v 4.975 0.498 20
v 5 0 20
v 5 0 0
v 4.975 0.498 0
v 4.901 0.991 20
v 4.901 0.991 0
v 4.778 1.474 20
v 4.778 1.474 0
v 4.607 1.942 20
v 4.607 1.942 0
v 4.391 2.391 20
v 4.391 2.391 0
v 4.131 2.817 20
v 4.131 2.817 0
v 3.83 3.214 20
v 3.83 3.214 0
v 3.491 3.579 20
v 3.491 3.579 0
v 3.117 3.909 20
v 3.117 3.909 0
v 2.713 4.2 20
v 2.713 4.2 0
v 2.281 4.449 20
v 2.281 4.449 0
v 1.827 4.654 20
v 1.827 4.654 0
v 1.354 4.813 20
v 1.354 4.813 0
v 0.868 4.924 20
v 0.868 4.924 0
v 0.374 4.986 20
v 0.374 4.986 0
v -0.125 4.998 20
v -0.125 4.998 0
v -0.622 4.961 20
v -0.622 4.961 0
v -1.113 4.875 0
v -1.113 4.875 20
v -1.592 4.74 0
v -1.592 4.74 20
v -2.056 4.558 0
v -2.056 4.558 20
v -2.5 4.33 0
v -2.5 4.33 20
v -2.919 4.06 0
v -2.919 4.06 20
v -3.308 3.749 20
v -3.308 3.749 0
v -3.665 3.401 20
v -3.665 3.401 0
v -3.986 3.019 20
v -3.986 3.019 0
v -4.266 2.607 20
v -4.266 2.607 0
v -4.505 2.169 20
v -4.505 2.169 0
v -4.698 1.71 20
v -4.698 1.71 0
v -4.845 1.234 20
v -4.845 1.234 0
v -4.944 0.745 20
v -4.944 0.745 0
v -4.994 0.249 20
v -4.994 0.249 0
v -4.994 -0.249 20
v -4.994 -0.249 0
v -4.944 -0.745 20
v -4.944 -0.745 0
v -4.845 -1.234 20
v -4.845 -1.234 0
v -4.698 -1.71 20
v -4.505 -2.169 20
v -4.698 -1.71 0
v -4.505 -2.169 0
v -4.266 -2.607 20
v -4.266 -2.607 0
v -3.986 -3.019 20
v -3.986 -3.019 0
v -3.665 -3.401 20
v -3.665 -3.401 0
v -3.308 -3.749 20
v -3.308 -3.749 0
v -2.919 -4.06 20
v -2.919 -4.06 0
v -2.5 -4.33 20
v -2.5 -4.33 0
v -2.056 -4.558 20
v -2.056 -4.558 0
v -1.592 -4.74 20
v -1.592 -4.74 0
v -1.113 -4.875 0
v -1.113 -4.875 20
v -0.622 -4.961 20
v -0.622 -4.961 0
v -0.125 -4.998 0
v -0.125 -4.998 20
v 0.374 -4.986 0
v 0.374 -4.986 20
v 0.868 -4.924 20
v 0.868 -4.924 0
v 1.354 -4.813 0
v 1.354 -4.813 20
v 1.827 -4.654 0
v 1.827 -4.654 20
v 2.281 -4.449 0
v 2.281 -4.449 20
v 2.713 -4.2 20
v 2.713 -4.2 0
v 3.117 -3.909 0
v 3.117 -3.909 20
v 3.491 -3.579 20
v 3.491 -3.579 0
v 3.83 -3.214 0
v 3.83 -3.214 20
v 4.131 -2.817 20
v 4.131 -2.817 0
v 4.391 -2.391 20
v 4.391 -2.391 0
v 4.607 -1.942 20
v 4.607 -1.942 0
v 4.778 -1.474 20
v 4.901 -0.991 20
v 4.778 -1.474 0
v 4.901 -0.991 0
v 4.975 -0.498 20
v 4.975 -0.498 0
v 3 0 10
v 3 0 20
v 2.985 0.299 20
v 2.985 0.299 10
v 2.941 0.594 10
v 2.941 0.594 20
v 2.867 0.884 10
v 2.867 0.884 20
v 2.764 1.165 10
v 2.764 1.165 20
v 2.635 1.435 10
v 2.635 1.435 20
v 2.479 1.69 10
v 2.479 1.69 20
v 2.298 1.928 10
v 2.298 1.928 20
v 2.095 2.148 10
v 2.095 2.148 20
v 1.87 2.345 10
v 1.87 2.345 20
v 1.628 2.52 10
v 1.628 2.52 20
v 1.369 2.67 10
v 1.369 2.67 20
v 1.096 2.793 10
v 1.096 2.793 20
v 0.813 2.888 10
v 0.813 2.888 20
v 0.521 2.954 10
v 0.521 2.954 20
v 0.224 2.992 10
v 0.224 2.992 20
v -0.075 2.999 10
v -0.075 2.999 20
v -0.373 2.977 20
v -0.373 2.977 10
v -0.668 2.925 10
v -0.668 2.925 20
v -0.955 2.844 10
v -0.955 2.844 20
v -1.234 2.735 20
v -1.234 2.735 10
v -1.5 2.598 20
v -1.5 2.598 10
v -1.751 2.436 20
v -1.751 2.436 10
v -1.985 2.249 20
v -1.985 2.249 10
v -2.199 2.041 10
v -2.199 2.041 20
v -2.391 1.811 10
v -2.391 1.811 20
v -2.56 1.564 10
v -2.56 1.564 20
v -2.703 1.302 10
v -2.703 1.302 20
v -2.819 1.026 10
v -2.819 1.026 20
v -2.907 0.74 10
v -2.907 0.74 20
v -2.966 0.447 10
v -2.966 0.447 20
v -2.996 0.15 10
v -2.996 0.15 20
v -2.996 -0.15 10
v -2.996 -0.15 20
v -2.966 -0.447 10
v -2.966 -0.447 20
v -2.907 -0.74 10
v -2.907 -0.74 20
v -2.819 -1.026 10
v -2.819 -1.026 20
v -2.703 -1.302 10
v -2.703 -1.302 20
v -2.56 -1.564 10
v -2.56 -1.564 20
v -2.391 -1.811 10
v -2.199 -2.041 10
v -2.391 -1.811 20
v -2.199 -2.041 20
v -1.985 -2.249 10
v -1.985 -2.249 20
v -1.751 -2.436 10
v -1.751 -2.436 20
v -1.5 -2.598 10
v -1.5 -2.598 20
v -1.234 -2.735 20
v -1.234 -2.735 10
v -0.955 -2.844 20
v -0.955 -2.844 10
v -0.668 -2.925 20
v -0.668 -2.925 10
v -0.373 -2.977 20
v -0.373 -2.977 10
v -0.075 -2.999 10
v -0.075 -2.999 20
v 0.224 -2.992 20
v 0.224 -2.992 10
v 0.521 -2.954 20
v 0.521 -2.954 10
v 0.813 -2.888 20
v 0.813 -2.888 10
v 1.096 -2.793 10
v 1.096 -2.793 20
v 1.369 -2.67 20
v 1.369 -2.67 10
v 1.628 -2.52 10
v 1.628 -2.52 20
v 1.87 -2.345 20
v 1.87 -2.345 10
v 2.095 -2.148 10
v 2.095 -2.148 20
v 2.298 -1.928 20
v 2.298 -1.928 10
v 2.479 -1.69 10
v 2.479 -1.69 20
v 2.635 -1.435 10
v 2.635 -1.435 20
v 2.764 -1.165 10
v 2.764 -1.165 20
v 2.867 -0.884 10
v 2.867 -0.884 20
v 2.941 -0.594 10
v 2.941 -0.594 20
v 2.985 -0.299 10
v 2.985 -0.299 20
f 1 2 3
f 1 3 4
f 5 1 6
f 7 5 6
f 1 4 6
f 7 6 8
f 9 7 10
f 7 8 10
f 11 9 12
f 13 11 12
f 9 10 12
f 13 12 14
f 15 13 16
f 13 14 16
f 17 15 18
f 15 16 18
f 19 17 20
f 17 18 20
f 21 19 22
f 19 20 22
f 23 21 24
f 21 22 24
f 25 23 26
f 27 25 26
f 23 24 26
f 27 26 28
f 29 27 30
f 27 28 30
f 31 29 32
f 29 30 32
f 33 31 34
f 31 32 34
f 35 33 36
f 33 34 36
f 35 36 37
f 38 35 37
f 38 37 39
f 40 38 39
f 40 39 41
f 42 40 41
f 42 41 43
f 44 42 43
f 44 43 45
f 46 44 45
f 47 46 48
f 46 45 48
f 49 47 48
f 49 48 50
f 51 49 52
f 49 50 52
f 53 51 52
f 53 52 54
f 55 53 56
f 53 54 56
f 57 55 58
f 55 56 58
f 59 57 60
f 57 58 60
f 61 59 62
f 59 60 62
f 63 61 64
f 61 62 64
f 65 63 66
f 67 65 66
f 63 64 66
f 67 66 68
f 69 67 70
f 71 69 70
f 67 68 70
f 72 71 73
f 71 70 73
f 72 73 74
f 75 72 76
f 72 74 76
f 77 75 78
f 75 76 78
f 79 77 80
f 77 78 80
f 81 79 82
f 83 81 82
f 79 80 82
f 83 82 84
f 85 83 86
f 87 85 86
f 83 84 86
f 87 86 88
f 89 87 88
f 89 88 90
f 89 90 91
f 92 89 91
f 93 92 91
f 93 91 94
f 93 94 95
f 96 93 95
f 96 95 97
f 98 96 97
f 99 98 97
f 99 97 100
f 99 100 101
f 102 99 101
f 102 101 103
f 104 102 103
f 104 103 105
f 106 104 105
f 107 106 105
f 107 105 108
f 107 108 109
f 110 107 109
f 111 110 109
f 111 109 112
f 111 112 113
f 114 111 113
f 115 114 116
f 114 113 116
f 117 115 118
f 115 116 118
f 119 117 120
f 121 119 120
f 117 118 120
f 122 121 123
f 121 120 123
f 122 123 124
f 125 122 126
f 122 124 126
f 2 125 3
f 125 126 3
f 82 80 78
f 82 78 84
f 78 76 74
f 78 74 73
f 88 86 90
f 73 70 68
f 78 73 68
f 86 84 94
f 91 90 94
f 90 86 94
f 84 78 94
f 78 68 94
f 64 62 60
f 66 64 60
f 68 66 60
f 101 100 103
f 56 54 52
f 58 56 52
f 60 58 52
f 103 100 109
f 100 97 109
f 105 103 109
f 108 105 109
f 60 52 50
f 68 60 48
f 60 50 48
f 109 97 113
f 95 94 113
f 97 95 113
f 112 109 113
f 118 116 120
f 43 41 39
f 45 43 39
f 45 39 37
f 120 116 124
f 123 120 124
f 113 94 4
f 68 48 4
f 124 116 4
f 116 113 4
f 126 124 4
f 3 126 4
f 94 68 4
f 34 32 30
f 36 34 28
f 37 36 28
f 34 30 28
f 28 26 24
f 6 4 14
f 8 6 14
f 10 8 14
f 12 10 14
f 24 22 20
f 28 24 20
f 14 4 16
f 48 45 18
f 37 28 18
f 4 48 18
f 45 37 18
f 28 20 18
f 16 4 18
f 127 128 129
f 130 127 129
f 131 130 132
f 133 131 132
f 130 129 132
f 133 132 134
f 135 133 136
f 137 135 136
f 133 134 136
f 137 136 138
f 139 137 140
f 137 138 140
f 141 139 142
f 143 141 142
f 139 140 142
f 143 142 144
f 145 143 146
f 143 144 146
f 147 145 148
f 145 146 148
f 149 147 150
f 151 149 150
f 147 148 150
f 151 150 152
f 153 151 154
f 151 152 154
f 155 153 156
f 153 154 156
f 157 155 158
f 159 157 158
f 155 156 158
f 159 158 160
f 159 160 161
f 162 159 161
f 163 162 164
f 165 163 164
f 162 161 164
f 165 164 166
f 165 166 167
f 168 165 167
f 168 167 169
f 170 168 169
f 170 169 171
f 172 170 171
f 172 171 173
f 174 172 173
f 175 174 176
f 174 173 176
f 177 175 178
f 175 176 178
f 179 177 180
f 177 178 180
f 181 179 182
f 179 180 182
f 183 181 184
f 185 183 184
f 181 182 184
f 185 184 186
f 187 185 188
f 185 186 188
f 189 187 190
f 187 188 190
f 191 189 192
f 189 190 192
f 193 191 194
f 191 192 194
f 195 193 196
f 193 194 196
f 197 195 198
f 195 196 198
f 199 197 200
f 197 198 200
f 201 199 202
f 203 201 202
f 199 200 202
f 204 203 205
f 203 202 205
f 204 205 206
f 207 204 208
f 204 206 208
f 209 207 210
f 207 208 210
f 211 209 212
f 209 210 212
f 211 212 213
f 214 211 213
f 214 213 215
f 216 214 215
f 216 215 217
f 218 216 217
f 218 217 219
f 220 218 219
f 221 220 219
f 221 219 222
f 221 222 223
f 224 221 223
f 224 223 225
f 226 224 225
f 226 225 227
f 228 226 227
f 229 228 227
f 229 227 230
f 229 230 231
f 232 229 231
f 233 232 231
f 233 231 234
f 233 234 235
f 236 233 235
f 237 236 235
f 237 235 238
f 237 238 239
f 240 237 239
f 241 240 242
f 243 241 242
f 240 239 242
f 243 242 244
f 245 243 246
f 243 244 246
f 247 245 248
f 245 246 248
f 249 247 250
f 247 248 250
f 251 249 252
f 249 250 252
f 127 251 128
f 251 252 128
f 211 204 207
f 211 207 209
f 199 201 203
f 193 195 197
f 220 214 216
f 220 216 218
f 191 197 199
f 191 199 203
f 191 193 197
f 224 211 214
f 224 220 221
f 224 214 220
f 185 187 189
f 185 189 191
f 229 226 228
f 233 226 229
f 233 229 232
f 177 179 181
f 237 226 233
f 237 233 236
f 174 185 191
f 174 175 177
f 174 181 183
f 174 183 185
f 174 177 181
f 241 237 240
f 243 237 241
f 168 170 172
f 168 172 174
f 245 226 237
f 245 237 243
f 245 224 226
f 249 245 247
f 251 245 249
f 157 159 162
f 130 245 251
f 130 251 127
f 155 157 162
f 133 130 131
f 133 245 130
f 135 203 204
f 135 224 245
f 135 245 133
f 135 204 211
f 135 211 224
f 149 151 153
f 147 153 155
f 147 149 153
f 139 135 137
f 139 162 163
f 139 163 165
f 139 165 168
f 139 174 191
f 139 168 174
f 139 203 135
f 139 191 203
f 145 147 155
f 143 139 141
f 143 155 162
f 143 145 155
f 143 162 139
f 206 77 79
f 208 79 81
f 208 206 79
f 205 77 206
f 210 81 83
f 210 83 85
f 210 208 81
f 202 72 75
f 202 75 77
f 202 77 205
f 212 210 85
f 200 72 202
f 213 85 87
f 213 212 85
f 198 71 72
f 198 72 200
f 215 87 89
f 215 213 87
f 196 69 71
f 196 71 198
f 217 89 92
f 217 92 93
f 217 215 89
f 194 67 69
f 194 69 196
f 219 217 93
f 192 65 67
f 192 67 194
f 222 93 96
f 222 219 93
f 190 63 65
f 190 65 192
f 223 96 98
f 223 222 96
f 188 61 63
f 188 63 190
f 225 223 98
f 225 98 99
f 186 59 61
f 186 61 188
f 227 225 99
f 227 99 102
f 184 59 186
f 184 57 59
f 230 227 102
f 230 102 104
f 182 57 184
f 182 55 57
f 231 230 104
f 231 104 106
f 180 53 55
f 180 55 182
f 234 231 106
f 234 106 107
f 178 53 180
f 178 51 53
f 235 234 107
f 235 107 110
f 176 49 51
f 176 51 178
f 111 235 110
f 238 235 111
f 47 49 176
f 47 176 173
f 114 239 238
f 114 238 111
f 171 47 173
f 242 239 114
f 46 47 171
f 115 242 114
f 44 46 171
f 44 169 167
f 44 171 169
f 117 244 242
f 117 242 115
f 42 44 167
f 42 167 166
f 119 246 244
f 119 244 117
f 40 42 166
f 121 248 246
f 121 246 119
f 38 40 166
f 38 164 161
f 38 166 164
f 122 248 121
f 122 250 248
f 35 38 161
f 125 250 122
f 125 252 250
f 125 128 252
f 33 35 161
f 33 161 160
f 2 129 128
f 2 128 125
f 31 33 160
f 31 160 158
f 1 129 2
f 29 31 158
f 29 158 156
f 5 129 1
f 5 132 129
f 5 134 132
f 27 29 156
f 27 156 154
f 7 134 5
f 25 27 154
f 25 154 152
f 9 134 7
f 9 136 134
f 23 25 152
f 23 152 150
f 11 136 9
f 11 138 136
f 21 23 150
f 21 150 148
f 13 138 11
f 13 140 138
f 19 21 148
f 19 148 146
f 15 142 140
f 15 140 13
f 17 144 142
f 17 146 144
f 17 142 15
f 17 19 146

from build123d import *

# Parameters (mm, degrees)
F0_R     = 5
F1_DEPTH = 20
F2_R     = 3
F3_DEPTH = 10
F4_DEPTH = 10


with BuildPart() as f1:
    # F0 (on Top) → F1 (new body)
    with BuildSketch(Plane.XY):
        Circle(F0_R)
    extrude(amount=F1_DEPTH)

    # F2 (on face) → F3 (cut)
    with BuildSketch(Plane.XY.offset(20)):
        Circle(F2_R)
    extrude(amount=F3_DEPTH, mode=Mode.SUBTRACT)

    # F2 (on face) → F4 (cut)
    with BuildSketch(Plane.XY.offset(20)):
        Circle(F2_R)
    extrude(amount=-F4_DEPTH, mode=Mode.SUBTRACT)


solid = f1.part
